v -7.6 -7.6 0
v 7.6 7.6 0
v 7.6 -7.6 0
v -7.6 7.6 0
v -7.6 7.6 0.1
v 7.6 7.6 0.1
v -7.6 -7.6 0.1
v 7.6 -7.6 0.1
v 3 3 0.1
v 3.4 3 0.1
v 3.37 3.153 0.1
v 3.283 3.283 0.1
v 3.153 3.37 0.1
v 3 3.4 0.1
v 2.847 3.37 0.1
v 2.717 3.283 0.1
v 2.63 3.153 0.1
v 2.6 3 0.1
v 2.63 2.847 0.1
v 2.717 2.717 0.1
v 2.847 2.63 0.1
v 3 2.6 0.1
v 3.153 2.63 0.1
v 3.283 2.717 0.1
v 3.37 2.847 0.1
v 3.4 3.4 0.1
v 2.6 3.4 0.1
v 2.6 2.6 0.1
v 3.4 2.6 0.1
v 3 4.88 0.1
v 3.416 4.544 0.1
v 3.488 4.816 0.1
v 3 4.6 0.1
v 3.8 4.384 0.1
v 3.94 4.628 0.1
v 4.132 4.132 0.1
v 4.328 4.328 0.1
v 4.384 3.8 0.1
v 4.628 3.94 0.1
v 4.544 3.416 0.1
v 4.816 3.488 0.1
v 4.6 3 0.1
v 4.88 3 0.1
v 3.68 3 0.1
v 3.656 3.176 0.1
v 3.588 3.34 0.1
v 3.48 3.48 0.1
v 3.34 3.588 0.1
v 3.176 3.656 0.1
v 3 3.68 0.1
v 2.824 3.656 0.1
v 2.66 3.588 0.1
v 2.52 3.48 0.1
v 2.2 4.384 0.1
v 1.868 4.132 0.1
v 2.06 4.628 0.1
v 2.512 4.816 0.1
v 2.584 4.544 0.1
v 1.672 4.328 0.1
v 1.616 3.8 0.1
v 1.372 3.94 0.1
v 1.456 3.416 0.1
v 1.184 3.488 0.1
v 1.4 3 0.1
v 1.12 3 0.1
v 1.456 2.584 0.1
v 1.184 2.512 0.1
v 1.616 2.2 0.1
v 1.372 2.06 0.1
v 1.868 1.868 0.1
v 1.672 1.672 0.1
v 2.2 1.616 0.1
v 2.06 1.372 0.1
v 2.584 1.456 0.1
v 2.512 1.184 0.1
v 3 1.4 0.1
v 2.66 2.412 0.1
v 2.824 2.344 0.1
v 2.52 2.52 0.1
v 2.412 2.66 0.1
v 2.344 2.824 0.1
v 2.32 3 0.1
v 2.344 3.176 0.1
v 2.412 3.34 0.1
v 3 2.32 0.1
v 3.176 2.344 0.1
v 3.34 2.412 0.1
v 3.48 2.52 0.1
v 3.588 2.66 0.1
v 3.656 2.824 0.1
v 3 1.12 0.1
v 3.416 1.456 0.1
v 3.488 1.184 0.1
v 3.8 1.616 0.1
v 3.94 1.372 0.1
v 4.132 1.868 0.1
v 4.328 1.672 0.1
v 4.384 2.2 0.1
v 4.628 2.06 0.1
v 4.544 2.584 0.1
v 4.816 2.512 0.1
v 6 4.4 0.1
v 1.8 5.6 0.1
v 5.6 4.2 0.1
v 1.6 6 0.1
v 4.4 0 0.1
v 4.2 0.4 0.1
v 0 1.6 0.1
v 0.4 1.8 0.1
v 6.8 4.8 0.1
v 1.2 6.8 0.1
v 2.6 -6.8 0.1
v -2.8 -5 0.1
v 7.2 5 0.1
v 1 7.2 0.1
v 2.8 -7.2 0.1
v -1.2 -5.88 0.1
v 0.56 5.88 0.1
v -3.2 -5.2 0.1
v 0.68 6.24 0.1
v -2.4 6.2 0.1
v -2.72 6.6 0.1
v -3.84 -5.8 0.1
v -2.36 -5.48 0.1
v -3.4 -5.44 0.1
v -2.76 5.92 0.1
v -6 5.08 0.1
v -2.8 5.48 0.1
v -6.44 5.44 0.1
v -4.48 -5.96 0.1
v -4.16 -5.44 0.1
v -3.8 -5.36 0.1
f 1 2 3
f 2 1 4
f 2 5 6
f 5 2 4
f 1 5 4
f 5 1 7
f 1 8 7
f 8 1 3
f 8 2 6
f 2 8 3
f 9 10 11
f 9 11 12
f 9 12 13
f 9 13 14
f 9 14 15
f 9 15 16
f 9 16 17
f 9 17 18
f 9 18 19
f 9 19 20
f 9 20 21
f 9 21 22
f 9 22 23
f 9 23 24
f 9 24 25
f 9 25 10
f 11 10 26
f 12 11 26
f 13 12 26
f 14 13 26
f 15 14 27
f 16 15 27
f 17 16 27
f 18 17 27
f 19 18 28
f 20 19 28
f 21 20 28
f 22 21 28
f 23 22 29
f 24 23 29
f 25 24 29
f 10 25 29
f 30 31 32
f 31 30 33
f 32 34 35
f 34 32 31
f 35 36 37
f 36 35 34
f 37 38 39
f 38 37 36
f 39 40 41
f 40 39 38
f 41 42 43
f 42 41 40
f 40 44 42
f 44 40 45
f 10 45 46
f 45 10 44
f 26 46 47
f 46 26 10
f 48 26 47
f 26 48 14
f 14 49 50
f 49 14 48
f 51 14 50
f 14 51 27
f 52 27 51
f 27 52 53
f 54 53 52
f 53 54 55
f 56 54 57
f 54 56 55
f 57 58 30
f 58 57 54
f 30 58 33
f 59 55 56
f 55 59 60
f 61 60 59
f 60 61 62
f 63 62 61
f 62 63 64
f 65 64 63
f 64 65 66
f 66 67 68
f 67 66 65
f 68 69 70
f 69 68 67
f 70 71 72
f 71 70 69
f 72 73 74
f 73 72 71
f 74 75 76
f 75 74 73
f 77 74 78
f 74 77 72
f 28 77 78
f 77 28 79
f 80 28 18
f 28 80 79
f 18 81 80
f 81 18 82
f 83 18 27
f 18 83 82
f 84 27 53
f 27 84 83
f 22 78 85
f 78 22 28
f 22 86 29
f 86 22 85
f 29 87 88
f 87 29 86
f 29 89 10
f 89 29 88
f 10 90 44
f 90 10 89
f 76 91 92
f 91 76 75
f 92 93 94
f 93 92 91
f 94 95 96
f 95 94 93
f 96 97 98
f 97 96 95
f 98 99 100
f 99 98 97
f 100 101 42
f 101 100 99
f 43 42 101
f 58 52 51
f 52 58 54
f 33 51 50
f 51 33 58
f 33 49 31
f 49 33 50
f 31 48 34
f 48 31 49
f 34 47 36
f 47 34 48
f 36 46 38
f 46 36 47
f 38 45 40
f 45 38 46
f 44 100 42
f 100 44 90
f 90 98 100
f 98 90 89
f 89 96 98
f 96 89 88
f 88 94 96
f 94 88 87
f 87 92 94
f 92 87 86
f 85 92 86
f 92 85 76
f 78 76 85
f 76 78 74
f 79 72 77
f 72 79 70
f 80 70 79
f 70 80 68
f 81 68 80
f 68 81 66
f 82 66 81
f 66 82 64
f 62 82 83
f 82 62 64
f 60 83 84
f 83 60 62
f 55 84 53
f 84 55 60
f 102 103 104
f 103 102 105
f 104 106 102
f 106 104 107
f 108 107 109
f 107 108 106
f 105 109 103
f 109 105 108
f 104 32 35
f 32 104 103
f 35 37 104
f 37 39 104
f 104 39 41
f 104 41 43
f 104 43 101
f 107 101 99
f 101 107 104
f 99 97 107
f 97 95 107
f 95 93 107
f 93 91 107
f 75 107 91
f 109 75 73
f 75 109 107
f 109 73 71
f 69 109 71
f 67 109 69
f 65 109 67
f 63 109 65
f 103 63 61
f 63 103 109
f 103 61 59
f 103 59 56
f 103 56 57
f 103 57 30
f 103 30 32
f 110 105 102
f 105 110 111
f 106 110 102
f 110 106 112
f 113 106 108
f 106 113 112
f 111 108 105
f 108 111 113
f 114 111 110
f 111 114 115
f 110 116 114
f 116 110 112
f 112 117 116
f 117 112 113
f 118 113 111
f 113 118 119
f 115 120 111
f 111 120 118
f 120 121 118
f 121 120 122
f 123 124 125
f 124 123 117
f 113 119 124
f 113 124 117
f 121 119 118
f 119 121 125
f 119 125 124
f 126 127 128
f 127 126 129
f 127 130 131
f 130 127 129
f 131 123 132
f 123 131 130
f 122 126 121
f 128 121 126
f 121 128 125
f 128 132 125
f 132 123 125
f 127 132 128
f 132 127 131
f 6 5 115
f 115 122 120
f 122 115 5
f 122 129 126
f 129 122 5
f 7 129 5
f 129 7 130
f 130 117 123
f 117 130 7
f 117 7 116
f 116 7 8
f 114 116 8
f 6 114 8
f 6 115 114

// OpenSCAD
// file: ../p/box5-12.scad
use <../lib.scad>
function ldraw_lib__box5_12() = [
// 0 Box with 5 Faces without Any Edges
// 0 Name: box5-12.dat
// 0 Author: Chris Dee [cwdee]
// 0 !LDRAW_ORG Primitive UPDATE 2009-02
// 0 !LICENSE Licensed under CC BY 4.0 : see CAreadme.txt
// 
// 0 BFC CERTIFY CCW
  [0,"BFC","CERTIFY"],
  [0,"BFC","CCW"],
// 
// 0 !HISTORY 2009-09-03 [PTadmin] Official Update 2009-02
// 
// 
// 4 16 1 1 1 1 1 -1 -1 1 -1 -1 1 1
  [4,16,1,1,1,1,1,-1,-1,1,-1,-1,1,1],
// 4 16 -1 0 1 1 0 1 1 1 1 -1 1 1
  [4,16,-1,0,1,1,0,1,1,1,1,-1,1,1],
// 4 16 -1 0 -1 -1 0 1 -1 1 1 -1 1 -1
  [4,16,-1,0,-1,-1,0,1,-1,1,1,-1,1,-1],
// 4 16 1 0 -1 -1 0 -1 -1 1 -1 1 1 -1
  [4,16,1,0,-1,-1,0,-1,-1,1,-1,1,1,-1],
// 4 16 1 0 1 1 0 -1 1 1 -1 1 1 1
  [4,16,1,0,1,1,0,-1,1,1,-1,1,1,1],
// 0
];
module ldraw_lib__box5_12(step=0, col=false, unit=2/5, alt=false, line=0.2, solid=!$preview)
    makepoly(ldraw_lib__box5_12(), step=step, col=col, unit=unit, alt=alt, line=line, solid=solid);
ldraw_lib__box5_12(line=0.2);
// file: ../p/4-4ndis.scad
use <../lib.scad>
function ldraw_lib__4_4ndis() = [
// 0 Disc Negative 1.0
// 0 Name: 4-4ndis.dat
// 0 Author: James Jessiman
// 0 !LDRAW_ORG Primitive UPDATE 2012-01
// 0 !LICENSE Licensed under CC BY 4.0 : see CAreadme.txt
// 
// 0 BFC CERTIFY CCW
  [0,"BFC","CERTIFY"],
  [0,"BFC","CCW"],
// 
// 0 !HISTORY 2002-03-23 [sbliss] Added BFC statement; compacted code
// 0 !HISTORY 2002-04-25 [PTadmin] Official Update 2002-02
// 0 !HISTORY 2007-06-24 [PTadmin] Header formatted for Contributor Agreement
// 0 !HISTORY 2008-07-01 [PTadmin] Official Update 2008-01
// 0 !HISTORY 2012-02-16 [Philo] Changed to CCW
// 0 !HISTORY 2012-03-30 [PTadmin] Official Update 2012-01
// 
// 
// 3 16 0.9239 0 0.3827 1 0 0 1 0 1
  [3,16,0.9239,0,0.3827,1,0,0,1,0,1],
// 3 16 0.7071 0 0.7071 0.9239 0 0.3827 1 0 1
  [3,16,0.7071,0,0.7071,0.9239,0,0.3827,1,0,1],
// 3 16 0.3827 0 0.9239 0.7071 0 0.7071 1 0 1
  [3,16,0.3827,0,0.9239,0.7071,0,0.7071,1,0,1],
// 3 16 0 0 1 0.3827 0 0.9239 1 0 1
  [3,16,0,0,1,0.3827,0,0.9239,1,0,1],
// 3 16 -0.3827 0 0.9239 0 0 1 -1 0 1
  [3,16,-0.3827,0,0.9239,0,0,1,-1,0,1],
// 3 16 -0.7071 0 0.7071 -0.3827 0 0.9239 -1 0 1
  [3,16,-0.7071,0,0.7071,-0.3827,0,0.9239,-1,0,1],
// 3 16 -0.9239 0 0.3827 -0.7071 0 0.7071 -1 0 1
  [3,16,-0.9239,0,0.3827,-0.7071,0,0.7071,-1,0,1],
// 3 16 -1 0 0 -0.9239 0 0.3827 -1 0 1
  [3,16,-1,0,0,-0.9239,0,0.3827,-1,0,1],
// 3 16 -0.9239 0 -0.3827 -1 0 0 -1 0 -1
  [3,16,-0.9239,0,-0.3827,-1,0,0,-1,0,-1],
// 3 16 -0.7071 0 -0.7071 -0.9239 0 -0.3827 -1 0 -1
  [3,16,-0.7071,0,-0.7071,-0.9239,0,-0.3827,-1,0,-1],
// 3 16 -0.3827 0 -0.9239 -0.7071 0 -0.7071 -1 0 -1
  [3,16,-0.3827,0,-0.9239,-0.7071,0,-0.7071,-1,0,-1],
// 3 16 0 0 -1 -0.3827 0 -0.9239 -1 0 -1
  [3,16,0,0,-1,-0.3827,0,-0.9239,-1,0,-1],
// 3 16 0.3827 0 -0.9239 0 0 -1 1 0 -1
  [3,16,0.3827,0,-0.9239,0,0,-1,1,0,-1],
// 3 16 0.7071 0 -0.7071 0.3827 0 -0.9239 1 0 -1
  [3,16,0.7071,0,-0.7071,0.3827,0,-0.9239,1,0,-1],
// 3 16 0.9239 0 -0.3827 0.7071 0 -0.7071 1 0 -1
  [3,16,0.9239,0,-0.3827,0.7071,0,-0.7071,1,0,-1],
// 3 16 1 0 0 0.9239 0 -0.3827 1 0 -1
  [3,16,1,0,0,0.9239,0,-0.3827,1,0,-1],
];
module ldraw_lib__4_4ndis(step=0, col=false, unit=2/5, alt=false, line=0.2, solid=!$preview)
    makepoly(ldraw_lib__4_4ndis(), step=step, col=col, unit=unit, alt=alt, line=line, solid=solid);
ldraw_lib__4_4ndis(line=0.2);
// file: ../p/4-4disc.scad
use <../lib.scad>
function ldraw_lib__4_4disc() = [
// 0 Disc 1.0
// 0 Name: 4-4disc.dat
// 0 Author: James Jessiman
// 0 !LDRAW_ORG Primitive UPDATE 2002-02
// 0 !LICENSE Licensed under CC BY 4.0 : see CAreadme.txt
// 
// 0 BFC CERTIFY CCW
  [0,"BFC","CERTIFY"],
  [0,"BFC","CCW"],
// 
// 0 !HISTORY 1998-12-15 [PTadmin] Official Update 1998-10
// 0 !HISTORY 2002-03-23 [sbliss] Added BFC statement
// 0 !HISTORY 2002-04-25 [PTadmin] Official Update 2002-02
// 0 !HISTORY 2007-06-24 [PTadmin] Header formatted for Contributor Agreement
// 0 !HISTORY 2008-07-01 [PTadmin] Official Update 2008-01
// 
// 
// 3 16 0 0 0 1 0 0 0.9239 0 0.3827
  [3,16,0,0,0,1,0,0,0.9239,0,0.3827],
// 3 16 0 0 0 0.9239 0 0.3827 0.7071 0 0.7071
  [3,16,0,0,0,0.9239,0,0.3827,0.7071,0,0.7071],
// 3 16 0 0 0 0.7071 0 0.7071 0.3827 0 0.9239
  [3,16,0,0,0,0.7071,0,0.7071,0.3827,0,0.9239],
// 3 16 0 0 0 0.3827 0 0.9239 0 0 1
  [3,16,0,0,0,0.3827,0,0.9239,0,0,1],
// 3 16 0 0 0 0 0 1 -0.3827 0 0.9239
  [3,16,0,0,0,0,0,1,-0.3827,0,0.9239],
// 3 16 0 0 0 -0.3827 0 0.9239 -0.7071 0 0.7071
  [3,16,0,0,0,-0.3827,0,0.9239,-0.7071,0,0.7071],
// 3 16 0 0 0 -0.7071 0 0.7071 -0.9239 0 0.3827
  [3,16,0,0,0,-0.7071,0,0.7071,-0.9239,0,0.3827],
// 3 16 0 0 0 -0.9239 0 0.3827 -1 0 -0
  [3,16,0,0,0,-0.9239,0,0.3827,-1,0,-0],
// 3 16 0 0 0 -1 0 -0 -0.9239 0 -0.3827
  [3,16,0,0,0,-1,0,-0,-0.9239,0,-0.3827],
// 3 16 0 0 0 -0.9239 0 -0.3827 -0.7071 0 -0.7071
  [3,16,0,0,0,-0.9239,0,-0.3827,-0.7071,0,-0.7071],
// 3 16 0 0 0 -0.7071 0 -0.7071 -0.3827 0 -0.9239
  [3,16,0,0,0,-0.7071,0,-0.7071,-0.3827,0,-0.9239],
// 3 16 0 0 0 -0.3827 0 -0.9239 0 0 -1
  [3,16,0,0,0,-0.3827,0,-0.9239,0,0,-1],
// 3 16 0 0 0 0 0 -1 0.3827 0 -0.9239
  [3,16,0,0,0,0,0,-1,0.3827,0,-0.9239],
// 3 16 0 0 0 0.3827 0 -0.9239 0.7071 0 -0.7071
  [3,16,0,0,0,0.3827,0,-0.9239,0.7071,0,-0.7071],
// 3 16 0 0 0 0.7071 0 -0.7071 0.9239 0 -0.3827
  [3,16,0,0,0,0.7071,0,-0.7071,0.9239,0,-0.3827],
// 3 16 0 0 0 0.9239 0 -0.3827 1 0 0
  [3,16,0,0,0,0.9239,0,-0.3827,1,0,0],
// 0
];
module ldraw_lib__4_4disc(step=0, col=false, unit=2/5, alt=false, line=0.2, solid=!$preview)
    makepoly(ldraw_lib__4_4disc(), step=step, col=col, unit=unit, alt=alt, line=line, solid=solid);
ldraw_lib__4_4disc(line=0.2);
// main file
use <../lib.scad>
use <../p/4-4disc.scad>
use <../p/4-4ndis.scad>
use <../p/box5-12.scad>
function ldraw_lib__192385d() = [
// 0 Sticker  1.9 x  1.9 with Tickets on Yellow Background
// 0 Name: 192385d.dat
// 0 Author: Takeshi Takahashi [RainbowDolphin]
// 0 !LDRAW_ORG Part UPDATE 2024-08
// 0 !LICENSE Licensed under CC BY 4.0 : see CAreadme.txt
// 
// 0 BFC CERTIFY CCW
  [0,"BFC","CERTIFY"],
  [0,"BFC","CCW"],
// 
// 0 !KEYWORDS Main Street, Set 6390
// 
// 0 !HISTORY 2024-09-30 [OrionP] Official Update 2024-08
// 
// 
// 1 16 0 -0.25 0 19 0 0 0 0.25 0 0 0 19 box5-12.dat
  [1,16,0,-0.25,0,19,0,0,0,0.25,0,0,0,19, ldraw_lib__box5_12()],
// 1 14 7.5 -0.25 7.5 1 0 0 0 1 0 0 0 1 4-4disc.dat
  [1,14,7.5,-0.25,7.5,1,0,0,0,1,0,0,0,1, ldraw_lib__4_4disc()],
// 1 0 7.5 -0.25 7.5 1 0 0 0 1 0 0 0 1 4-4ndis.dat
  [1,0,7.5,-0.25,7.5,1,0,0,0,1,0,0,0,1, ldraw_lib__4_4ndis()],
// 4 0 8.72 -0.25 12.04 7.5 -0.25 12.2 7.5 -0.25 11.5 8.54 -0.25 11.36
  [4,0,8.72,-0.25,12.04,7.5,-0.25,12.2,7.5,-0.25,11.5,8.54,-0.25,11.36],
// 4 0 9.85 -0.25 11.57 8.72 -0.25 12.04 8.54 -0.25 11.36 9.5 -0.25 10.96
  [4,0,9.85,-0.25,11.57,8.72,-0.25,12.04,8.54,-0.25,11.36,9.5,-0.25,10.96],
// 4 0 10.82 -0.25 10.82 9.85 -0.25 11.57 9.5 -0.25 10.96 10.33 -0.25 10.33
  [4,0,10.82,-0.25,10.82,9.85,-0.25,11.57,9.5,-0.25,10.96,10.33,-0.25,10.33],
// 4 0 11.57 -0.25 9.85 10.82 -0.25 10.82 10.33 -0.25 10.33 10.96 -0.25 9.5
  [4,0,11.57,-0.25,9.85,10.82,-0.25,10.82,10.33,-0.25,10.33,10.96,-0.25,9.5],
// 4 0 12.04 -0.25 8.72 11.57 -0.25 9.85 10.96 -0.25 9.5 11.36 -0.25 8.54
  [4,0,12.04,-0.25,8.72,11.57,-0.25,9.85,10.96,-0.25,9.5,11.36,-0.25,8.54],
// 4 0 12.2 -0.25 7.5 12.04 -0.25 8.72 11.36 -0.25 8.54 11.5 -0.25 7.5
  [4,0,12.2,-0.25,7.5,12.04,-0.25,8.72,11.36,-0.25,8.54,11.5,-0.25,7.5],
// 4 0 11.5 -0.25 7.5 11.36 -0.25 8.54 9.14 -0.25 7.94 9.2 -0.25 7.5
  [4,0,11.5,-0.25,7.5,11.36,-0.25,8.54,9.14,-0.25,7.94,9.2,-0.25,7.5],
// 4 0 8.5 -0.25 7.5 9.2 -0.25 7.5 9.14 -0.25 7.94 8.97 -0.25 8.35
  [4,0,8.5,-0.25,7.5,9.2,-0.25,7.5,9.14,-0.25,7.94,8.97,-0.25,8.35],
// 4 0 8.5 -0.25 8.5 8.5 -0.25 7.5 8.97 -0.25 8.35 8.7 -0.25 8.7
  [4,0,8.5,-0.25,8.5,8.5,-0.25,7.5,8.97,-0.25,8.35,8.7,-0.25,8.7],
// 4 0 8.5 -0.25 8.5 8.7 -0.25 8.7 8.35 -0.25 8.97 7.5 -0.25 8.5
  [4,0,8.5,-0.25,8.5,8.7,-0.25,8.7,8.35,-0.25,8.97,7.5,-0.25,8.5],
// 4 0 7.5 -0.25 8.5 8.35 -0.25 8.97 7.94 -0.25 9.14 7.5 -0.25 9.2
  [4,0,7.5,-0.25,8.5,8.35,-0.25,8.97,7.94,-0.25,9.14,7.5,-0.25,9.2],
// 4 0 7.5 -0.25 8.5 7.5 -0.25 9.2 7.06 -0.25 9.14 6.5 -0.25 8.5
  [4,0,7.5,-0.25,8.5,7.5,-0.25,9.2,7.06,-0.25,9.14,6.5,-0.25,8.5],
// 4 0 6.5 -0.25 8.5 7.06 -0.25 9.14 6.65 -0.25 8.97 6.3 -0.25 8.7
  [4,0,6.5,-0.25,8.5,7.06,-0.25,9.14,6.65,-0.25,8.97,6.3,-0.25,8.7],
// 4 0 6.3 -0.25 8.7 6.65 -0.25 8.97 5.5 -0.25 10.96 4.67 -0.25 10.33
  [4,0,6.3,-0.25,8.7,6.65,-0.25,8.97,5.5,-0.25,10.96,4.67,-0.25,10.33],
// 4 0 5.15 -0.25 11.57 4.67 -0.25 10.33 5.5 -0.25 10.96 6.28 -0.25 12.04
  [4,0,5.15,-0.25,11.57,4.67,-0.25,10.33,5.5,-0.25,10.96,6.28,-0.25,12.04],
// 4 0 6.28 -0.25 12.04 5.5 -0.25 10.96 6.46 -0.25 11.36 7.5 -0.25 12.2
  [4,0,6.28,-0.25,12.04,5.5,-0.25,10.96,6.46,-0.25,11.36,7.5,-0.25,12.2],
// 3 0 7.5 -0.25 12.2 6.46 -0.25 11.36 7.5 -0.25 11.5
  [3,0,7.5,-0.25,12.2,6.46,-0.25,11.36,7.5,-0.25,11.5],
// 4 0 4.67 -0.25 10.33 5.15 -0.25 11.57 4.18 -0.25 10.82 4.04 -0.25 9.5
  [4,0,4.67,-0.25,10.33,5.15,-0.25,11.57,4.18,-0.25,10.82,4.04,-0.25,9.5],
// 4 0 4.04 -0.25 9.5 4.18 -0.25 10.82 3.43 -0.25 9.85 3.64 -0.25 8.54
  [4,0,4.04,-0.25,9.5,4.18,-0.25,10.82,3.43,-0.25,9.85,3.64,-0.25,8.54],
// 4 0 3.64 -0.25 8.54 3.43 -0.25 9.85 2.96 -0.25 8.72 3.5 -0.25 7.5
  [4,0,3.64,-0.25,8.54,3.43,-0.25,9.85,2.96,-0.25,8.72,3.5,-0.25,7.5],
// 4 0 3.5 -0.25 7.5 2.96 -0.25 8.72 2.8 -0.25 7.5 3.64 -0.25 6.46
  [4,0,3.5,-0.25,7.5,2.96,-0.25,8.72,2.8,-0.25,7.5,3.64,-0.25,6.46],
// 4 0 3.64 -0.25 6.46 2.8 -0.25 7.5 2.96 -0.25 6.28 4.04 -0.25 5.5
  [4,0,3.64,-0.25,6.46,2.8,-0.25,7.5,2.96,-0.25,6.28,4.04,-0.25,5.5],
// 4 0 4.04 -0.25 5.5 2.96 -0.25 6.28 3.43 -0.25 5.15 4.67 -0.25 4.67
  [4,0,4.04,-0.25,5.5,2.96,-0.25,6.28,3.43,-0.25,5.15,4.67,-0.25,4.67],
// 4 0 4.67 -0.25 4.67 3.43 -0.25 5.15 4.18 -0.25 4.18 5.5 -0.25 4.04
  [4,0,4.67,-0.25,4.67,3.43,-0.25,5.15,4.18,-0.25,4.18,5.5,-0.25,4.04],
// 4 0 5.5 -0.25 4.04 4.18 -0.25 4.18 5.15 -0.25 3.43 6.46 -0.25 3.64
  [4,0,5.5,-0.25,4.04,4.18,-0.25,4.18,5.15,-0.25,3.43,6.46,-0.25,3.64],
// 4 0 6.46 -0.25 3.64 5.15 -0.25 3.43 6.28 -0.25 2.96 7.5 -0.25 3.5
  [4,0,6.46,-0.25,3.64,5.15,-0.25,3.43,6.28,-0.25,2.96,7.5,-0.25,3.5],
// 4 0 6.65 -0.25 6.03 5.5 -0.25 4.04 6.46 -0.25 3.64 7.06 -0.25 5.86
  [4,0,6.65,-0.25,6.03,5.5,-0.25,4.04,6.46,-0.25,3.64,7.06,-0.25,5.86],
// 4 0 6.65 -0.25 6.03 7.06 -0.25 5.86 6.5 -0.25 6.5 6.3 -0.25 6.3
  [4,0,6.65,-0.25,6.03,7.06,-0.25,5.86,6.5,-0.25,6.5,6.3,-0.25,6.3],
// 4 0 6.03 -0.25 6.65 6.3 -0.25 6.3 6.5 -0.25 6.5 6.5 -0.25 7.5
  [4,0,6.03,-0.25,6.65,6.3,-0.25,6.3,6.5,-0.25,6.5,6.5,-0.25,7.5],
// 4 0 5.86 -0.25 7.06 6.03 -0.25 6.65 6.5 -0.25 7.5 5.8 -0.25 7.5
  [4,0,5.86,-0.25,7.06,6.03,-0.25,6.65,6.5,-0.25,7.5,5.8,-0.25,7.5],
// 4 0 5.86 -0.25 7.94 5.8 -0.25 7.5 6.5 -0.25 7.5 6.5 -0.25 8.5
  [4,0,5.86,-0.25,7.94,5.8,-0.25,7.5,6.5,-0.25,7.5,6.5,-0.25,8.5],
// 4 0 6.03 -0.25 8.35 5.86 -0.25 7.94 6.5 -0.25 8.5 6.3 -0.25 8.7
  [4,0,6.03,-0.25,8.35,5.86,-0.25,7.94,6.5,-0.25,8.5,6.3,-0.25,8.7],
// 4 0 7.5 -0.25 6.5 6.5 -0.25 6.5 7.06 -0.25 5.86 7.5 -0.25 5.8
  [4,0,7.5,-0.25,6.5,6.5,-0.25,6.5,7.06,-0.25,5.86,7.5,-0.25,5.8],
// 4 0 7.5 -0.25 6.5 7.5 -0.25 5.8 7.94 -0.25 5.86 8.5 -0.25 6.5
  [4,0,7.5,-0.25,6.5,7.5,-0.25,5.8,7.94,-0.25,5.86,8.5,-0.25,6.5],
// 4 0 8.5 -0.25 6.5 7.94 -0.25 5.86 8.35 -0.25 6.03 8.7 -0.25 6.3
  [4,0,8.5,-0.25,6.5,7.94,-0.25,5.86,8.35,-0.25,6.03,8.7,-0.25,6.3],
// 4 0 8.5 -0.25 6.5 8.7 -0.25 6.3 8.97 -0.25 6.65 8.5 -0.25 7.5
  [4,0,8.5,-0.25,6.5,8.7,-0.25,6.3,8.97,-0.25,6.65,8.5,-0.25,7.5],
// 4 0 8.5 -0.25 7.5 8.97 -0.25 6.65 9.14 -0.25 7.06 9.2 -0.25 7.5
  [4,0,8.5,-0.25,7.5,8.97,-0.25,6.65,9.14,-0.25,7.06,9.2,-0.25,7.5],
// 4 0 7.5 -0.25 3.5 6.28 -0.25 2.96 7.5 -0.25 2.8 8.54 -0.25 3.64
  [4,0,7.5,-0.25,3.5,6.28,-0.25,2.96,7.5,-0.25,2.8,8.54,-0.25,3.64],
// 4 0 8.54 -0.25 3.64 7.5 -0.25 2.8 8.72 -0.25 2.96 9.5 -0.25 4.04
  [4,0,8.54,-0.25,3.64,7.5,-0.25,2.8,8.72,-0.25,2.96,9.5,-0.25,4.04],
// 4 0 9.5 -0.25 4.04 8.72 -0.25 2.96 9.85 -0.25 3.43 10.33 -0.25 4.67
  [4,0,9.5,-0.25,4.04,8.72,-0.25,2.96,9.85,-0.25,3.43,10.33,-0.25,4.67],
// 4 0 10.33 -0.25 4.67 9.85 -0.25 3.43 10.82 -0.25 4.18 10.96 -0.25 5.5
  [4,0,10.33,-0.25,4.67,9.85,-0.25,3.43,10.82,-0.25,4.18,10.96,-0.25,5.5],
// 4 0 10.96 -0.25 5.5 10.82 -0.25 4.18 11.57 -0.25 5.15 11.36 -0.25 6.46
  [4,0,10.96,-0.25,5.5,10.82,-0.25,4.18,11.57,-0.25,5.15,11.36,-0.25,6.46],
// 4 0 11.36 -0.25 6.46 11.57 -0.25 5.15 12.04 -0.25 6.28 11.5 -0.25 7.5
  [4,0,11.36,-0.25,6.46,11.57,-0.25,5.15,12.04,-0.25,6.28,11.5,-0.25,7.5],
// 3 0 12.2 -0.25 7.5 11.5 -0.25 7.5 12.04 -0.25 6.28
  [3,0,12.2,-0.25,7.5,11.5,-0.25,7.5,12.04,-0.25,6.28],
// 4 14 6.46 -0.25 11.36 5.5 -0.25 10.96 6.65 -0.25 8.97 7.06 -0.25 9.14
  [4,14,6.46,-0.25,11.36,5.5,-0.25,10.96,6.65,-0.25,8.97,7.06,-0.25,9.14],
// 4 14 7.5 -0.25 11.5 6.46 -0.25 11.36 7.06 -0.25 9.14 7.5 -0.25 9.2
  [4,14,7.5,-0.25,11.5,6.46,-0.25,11.36,7.06,-0.25,9.14,7.5,-0.25,9.2],
// 4 14 8.54 -0.25 11.36 7.5 -0.25 11.5 7.5 -0.25 9.2 7.94 -0.25 9.14
  [4,14,8.54,-0.25,11.36,7.5,-0.25,11.5,7.5,-0.25,9.2,7.94,-0.25,9.14],
// 4 14 9.5 -0.25 10.96 8.54 -0.25 11.36 7.94 -0.25 9.14 8.35 -0.25 8.97
  [4,14,9.5,-0.25,10.96,8.54,-0.25,11.36,7.94,-0.25,9.14,8.35,-0.25,8.97],
// 4 14 10.33 -0.25 10.33 9.5 -0.25 10.96 8.35 -0.25 8.97 8.7 -0.25 8.7
  [4,14,10.33,-0.25,10.33,9.5,-0.25,10.96,8.35,-0.25,8.97,8.7,-0.25,8.7],
// 4 14 10.96 -0.25 9.5 10.33 -0.25 10.33 8.7 -0.25 8.7 8.97 -0.25 8.35
  [4,14,10.96,-0.25,9.5,10.33,-0.25,10.33,8.7,-0.25,8.7,8.97,-0.25,8.35],
// 4 14 11.36 -0.25 8.54 10.96 -0.25 9.5 8.97 -0.25 8.35 9.14 -0.25 7.94
  [4,14,11.36,-0.25,8.54,10.96,-0.25,9.5,8.97,-0.25,8.35,9.14,-0.25,7.94],
// 4 14 11.36 -0.25 6.46 11.5 -0.25 7.5 9.2 -0.25 7.5 9.14 -0.25 7.06
  [4,14,11.36,-0.25,6.46,11.5,-0.25,7.5,9.2,-0.25,7.5,9.14,-0.25,7.06],
// 4 14 10.96 -0.25 5.5 11.36 -0.25 6.46 9.14 -0.25 7.06 8.97 -0.25 6.65
  [4,14,10.96,-0.25,5.5,11.36,-0.25,6.46,9.14,-0.25,7.06,8.97,-0.25,6.65],
// 4 14 10.33 -0.25 4.67 10.96 -0.25 5.5 8.97 -0.25 6.65 8.7 -0.25 6.3
  [4,14,10.33,-0.25,4.67,10.96,-0.25,5.5,8.97,-0.25,6.65,8.7,-0.25,6.3],
// 4 14 9.5 -0.25 4.04 10.33 -0.25 4.67 8.7 -0.25 6.3 8.35 -0.25 6.03
  [4,14,9.5,-0.25,4.04,10.33,-0.25,4.67,8.7,-0.25,6.3,8.35,-0.25,6.03],
// 4 14 8.54 -0.25 3.64 9.5 -0.25 4.04 8.35 -0.25 6.03 7.94 -0.25 5.86
  [4,14,8.54,-0.25,3.64,9.5,-0.25,4.04,8.35,-0.25,6.03,7.94,-0.25,5.86],
// 4 14 7.5 -0.25 3.5 8.54 -0.25 3.64 7.94 -0.25 5.86 7.5 -0.25 5.8
  [4,14,7.5,-0.25,3.5,8.54,-0.25,3.64,7.94,-0.25,5.86,7.5,-0.25,5.8],
// 4 14 6.46 -0.25 3.64 7.5 -0.25 3.5 7.5 -0.25 5.8 7.06 -0.25 5.86
  [4,14,6.46,-0.25,3.64,7.5,-0.25,3.5,7.5,-0.25,5.8,7.06,-0.25,5.86],
// 4 14 4.67 -0.25 4.67 5.5 -0.25 4.04 6.65 -0.25 6.03 6.3 -0.25 6.3
  [4,14,4.67,-0.25,4.67,5.5,-0.25,4.04,6.65,-0.25,6.03,6.3,-0.25,6.3],
// 4 14 4.04 -0.25 5.5 4.67 -0.25 4.67 6.3 -0.25 6.3 6.03 -0.25 6.65
  [4,14,4.04,-0.25,5.5,4.67,-0.25,4.67,6.3,-0.25,6.3,6.03,-0.25,6.65],
// 4 14 3.64 -0.25 6.46 4.04 -0.25 5.5 6.03 -0.25 6.65 5.86 -0.25 7.06
  [4,14,3.64,-0.25,6.46,4.04,-0.25,5.5,6.03,-0.25,6.65,5.86,-0.25,7.06],
// 4 14 3.5 -0.25 7.5 3.64 -0.25 6.46 5.86 -0.25 7.06 5.8 -0.25 7.5
  [4,14,3.5,-0.25,7.5,3.64,-0.25,6.46,5.86,-0.25,7.06,5.8,-0.25,7.5],
// 4 14 3.64 -0.25 8.54 3.5 -0.25 7.5 5.8 -0.25 7.5 5.86 -0.25 7.94
  [4,14,3.64,-0.25,8.54,3.5,-0.25,7.5,5.8,-0.25,7.5,5.86,-0.25,7.94],
// 4 14 4.04 -0.25 9.5 3.64 -0.25 8.54 5.86 -0.25 7.94 6.03 -0.25 8.35
  [4,14,4.04,-0.25,9.5,3.64,-0.25,8.54,5.86,-0.25,7.94,6.03,-0.25,8.35],
// 4 14 4.67 -0.25 10.33 4.04 -0.25 9.5 6.03 -0.25 8.35 6.3 -0.25 8.7
  [4,14,4.67,-0.25,10.33,4.04,-0.25,9.5,6.03,-0.25,8.35,6.3,-0.25,8.7],
// 4 0 4 -0.25 15 4.5 -0.25 14 14 -0.25 10.5 15 -0.25 11
  [4,0,4,-0.25,15,4.5,-0.25,14,14,-0.25,10.5,15,-0.25,11],
// 4 0 15 -0.25 11 14 -0.25 10.5 10.5 -0.25 1 11 -0.25 0
  [4,0,15,-0.25,11,14,-0.25,10.5,10.5,-0.25,1,11,-0.25,0],
// 4 0 11 -0.25 0 10.5 -0.25 1 1 -0.25 4.5 0 -0.25 4
  [4,0,11,-0.25,0,10.5,-0.25,1,1,-0.25,4.5,0,-0.25,4],
// 4 0 0 -0.25 4 1 -0.25 4.5 4.5 -0.25 14 4 -0.25 15
  [4,0,0,-0.25,4,1,-0.25,4.5,4.5,-0.25,14,4,-0.25,15],
// 4 14 14 -0.25 10.5 4.5 -0.25 14 8.72 -0.25 12.04 9.85 -0.25 11.57
  [4,14,14,-0.25,10.5,4.5,-0.25,14,8.72,-0.25,12.04,9.85,-0.25,11.57],
// 3 14 9.85 -0.25 11.57 10.82 -0.25 10.82 14 -0.25 10.5
  [3,14,9.85,-0.25,11.57,10.82,-0.25,10.82,14,-0.25,10.5],
// 3 14 10.82 -0.25 10.82 11.57 -0.25 9.85 14 -0.25 10.5
  [3,14,10.82,-0.25,10.82,11.57,-0.25,9.85,14,-0.25,10.5],
// 3 14 14 -0.25 10.5 11.57 -0.25 9.85 12.04 -0.25 8.72
  [3,14,14,-0.25,10.5,11.57,-0.25,9.85,12.04,-0.25,8.72],
// 3 14 14 -0.25 10.5 12.04 -0.25 8.72 12.2 -0.25 7.5
  [3,14,14,-0.25,10.5,12.04,-0.25,8.72,12.2,-0.25,7.5],
// 3 14 14 -0.25 10.5 12.2 -0.25 7.5 12.04 -0.25 6.28
  [3,14,14,-0.25,10.5,12.2,-0.25,7.5,12.04,-0.25,6.28],
// 4 14 10.5 -0.25 1 14 -0.25 10.5 12.04 -0.25 6.28 11.57 -0.25 5.15
  [4,14,10.5,-0.25,1,14,-0.25,10.5,12.04,-0.25,6.28,11.57,-0.25,5.15],
// 3 14 11.57 -0.25 5.15 10.82 -0.25 4.18 10.5 -0.25 1
  [3,14,11.57,-0.25,5.15,10.82,-0.25,4.18,10.5,-0.25,1],
// 3 14 10.82 -0.25 4.18 9.85 -0.25 3.43 10.5 -0.25 1
  [3,14,10.82,-0.25,4.18,9.85,-0.25,3.43,10.5,-0.25,1],
// 3 14 9.85 -0.25 3.43 8.72 -0.25 2.96 10.5 -0.25 1
  [3,14,9.85,-0.25,3.43,8.72,-0.25,2.96,10.5,-0.25,1],
// 3 14 8.72 -0.25 2.96 7.5 -0.25 2.8 10.5 -0.25 1
  [3,14,8.72,-0.25,2.96,7.5,-0.25,2.8,10.5,-0.25,1],
// 3 14 6.28 -0.25 2.96 10.5 -0.25 1 7.5 -0.25 2.8
  [3,14,6.28,-0.25,2.96,10.5,-0.25,1,7.5,-0.25,2.8],
// 4 14 1 -0.25 4.5 10.5 -0.25 1 6.28 -0.25 2.96 5.15 -0.25 3.43
  [4,14,1,-0.25,4.5,10.5,-0.25,1,6.28,-0.25,2.96,5.15,-0.25,3.43],
// 3 14 1 -0.25 4.5 5.15 -0.25 3.43 4.18 -0.25 4.18
  [3,14,1,-0.25,4.5,5.15,-0.25,3.43,4.18,-0.25,4.18],
// 3 14 3.43 -0.25 5.15 1 -0.25 4.5 4.18 -0.25 4.18
  [3,14,3.43,-0.25,5.15,1,-0.25,4.5,4.18,-0.25,4.18],
// 3 14 2.96 -0.25 6.28 1 -0.25 4.5 3.43 -0.25 5.15
  [3,14,2.96,-0.25,6.28,1,-0.25,4.5,3.43,-0.25,5.15],
// 3 14 2.8 -0.25 7.5 1 -0.25 4.5 2.96 -0.25 6.28
  [3,14,2.8,-0.25,7.5,1,-0.25,4.5,2.96,-0.25,6.28],
// 3 14 2.96 -0.25 8.72 1 -0.25 4.5 2.8 -0.25 7.5
  [3,14,2.96,-0.25,8.72,1,-0.25,4.5,2.8,-0.25,7.5],
// 4 14 4.5 -0.25 14 1 -0.25 4.5 2.96 -0.25 8.72 3.43 -0.25 9.85
  [4,14,4.5,-0.25,14,1,-0.25,4.5,2.96,-0.25,8.72,3.43,-0.25,9.85],
// 3 14 4.5 -0.25 14 3.43 -0.25 9.85 4.18 -0.25 10.82
  [3,14,4.5,-0.25,14,3.43,-0.25,9.85,4.18,-0.25,10.82],
// 3 14 4.5 -0.25 14 4.18 -0.25 10.82 5.15 -0.25 11.57
  [3,14,4.5,-0.25,14,4.18,-0.25,10.82,5.15,-0.25,11.57],
// 3 14 4.5 -0.25 14 5.15 -0.25 11.57 6.28 -0.25 12.04
  [3,14,4.5,-0.25,14,5.15,-0.25,11.57,6.28,-0.25,12.04],
// 3 14 4.5 -0.25 14 6.28 -0.25 12.04 7.5 -0.25 12.2
  [3,14,4.5,-0.25,14,6.28,-0.25,12.04,7.5,-0.25,12.2],
// 3 14 4.5 -0.25 14 7.5 -0.25 12.2 8.72 -0.25 12.04
  [3,14,4.5,-0.25,14,7.5,-0.25,12.2,8.72,-0.25,12.04],
// 4 14 3 -0.25 17 4 -0.25 15 15 -0.25 11 17 -0.25 12
  [4,14,3,-0.25,17,4,-0.25,15,15,-0.25,11,17,-0.25,12],
// 4 14 17 -0.25 12 15 -0.25 11 11 -0.25 0 6.5 -0.25 -17
  [4,14,17,-0.25,12,15,-0.25,11,11,-0.25,0,6.5,-0.25,-17],
// 4 14 6.5 -0.25 -17 11 -0.25 0 0 -0.25 4 -7 -0.25 -12.5
  [4,14,6.5,-0.25,-17,11,-0.25,0,0,-0.25,4,-7,-0.25,-12.5],
// 4 14 0 -0.25 4 4 -0.25 15 3 -0.25 17 -7 -0.25 -12.5
  [4,14,0,-0.25,4,4,-0.25,15,3,-0.25,17,-7,-0.25,-12.5],
// 4 0 2.5 -0.25 18 3 -0.25 17 17 -0.25 12 18 -0.25 12.5
  [4,0,2.5,-0.25,18,3,-0.25,17,17,-0.25,12,18,-0.25,12.5],
// 4 0 18 -0.25 12.5 17 -0.25 12 6.5 -0.25 -17 7 -0.25 -18
  [4,0,18,-0.25,12.5,17,-0.25,12,6.5,-0.25,-17,7,-0.25,-18],
// 4 0 7 -0.25 -18 6.5 -0.25 -17 -7 -0.25 -12.5 -3 -0.25 -14.7
  [4,0,7,-0.25,-18,6.5,-0.25,-17,-7,-0.25,-12.5,-3,-0.25,-14.7],
// 4 0 -8 -0.25 -13 -7 -0.25 -12.5 3 -0.25 17 1.4 -0.25 14.7
  [4,0,-8,-0.25,-13,-7,-0.25,-12.5,3,-0.25,17,1.4,-0.25,14.7],
// 3 0 2.5 -0.25 18 1.7 -0.25 15.6 3 -0.25 17
  [3,0,2.5,-0.25,18,1.7,-0.25,15.6,3,-0.25,17],
// 3 0 3 -0.25 17 1.7 -0.25 15.6 1.4 -0.25 14.7
  [3,0,3,-0.25,17,1.7,-0.25,15.6,1.4,-0.25,14.7],
// 4 0 -6 -0.25 15.5 1.4 -0.25 14.7 1.7 -0.25 15.6 -6.8 -0.25 16.5
  [4,0,-6,-0.25,15.5,1.4,-0.25,14.7,1.7,-0.25,15.6,-6.8,-0.25,16.5],
// 4 0 -8.5 -0.25 -13.6 -9.6 -0.25 -14.5 -3 -0.25 -14.7 -5.9 -0.25 -13.7
  [4,0,-8.5,-0.25,-13.6,-9.6,-0.25,-14.5,-3,-0.25,-14.7,-5.9,-0.25,-13.7],
// 3 0 -7 -0.25 -12.5 -8 -0.25 -13 -5.9 -0.25 -13.7
  [3,0,-7,-0.25,-12.5,-8,-0.25,-13,-5.9,-0.25,-13.7],
// 3 0 -7 -0.25 -12.5 -5.9 -0.25 -13.7 -3 -0.25 -14.7
  [3,0,-7,-0.25,-12.5,-5.9,-0.25,-13.7,-3,-0.25,-14.7],
// 4 14 -8 -0.25 -13 1.4 -0.25 14.7 -6 -0.25 15.5 -8.5 -0.25 -13.6
  [4,14,-8,-0.25,-13,1.4,-0.25,14.7,-6,-0.25,15.5,-8.5,-0.25,-13.6],
// 3 14 -8 -0.25 -13 -8.5 -0.25 -13.6 -5.9 -0.25 -13.7
  [3,14,-8,-0.25,-13,-8.5,-0.25,-13.6,-5.9,-0.25,-13.7],
// 4 0 -15 -0.25 12.7 -7 -0.25 13.7 -6.9 -0.25 14.8 -16.1 -0.25 13.6
  [4,0,-15,-0.25,12.7,-7,-0.25,13.7,-6.9,-0.25,14.8,-16.1,-0.25,13.6],
// 4 0 -10.4 -0.25 -13.6 -15 -0.25 12.7 -16.1 -0.25 13.6 -11.2 -0.25 -14.9
  [4,0,-10.4,-0.25,-13.6,-15,-0.25,12.7,-16.1,-0.25,13.6,-11.2,-0.25,-14.9],
// 4 0 -10.4 -0.25 -13.6 -11.2 -0.25 -14.9 -9.6 -0.25 -14.5 -9.5 -0.25 -13.4
  [4,0,-10.4,-0.25,-13.6,-11.2,-0.25,-14.9,-9.6,-0.25,-14.5,-9.5,-0.25,-13.4],
// 3 0 -6.8 -0.25 16.5 -6.9 -0.25 14.8 -6 -0.25 15.5
  [3,0,-6.8,-0.25,16.5,-6.9,-0.25,14.8,-6,-0.25,15.5],
// 4 0 -6 -0.25 15.5 -6.9 -0.25 14.8 -7 -0.25 13.7 -8.5 -0.25 -13.6
  [4,0,-6,-0.25,15.5,-6.9,-0.25,14.8,-7,-0.25,13.7,-8.5,-0.25,-13.6],
// 3 0 -7 -0.25 13.7 -9.5 -0.25 -13.4 -8.5 -0.25 -13.6
  [3,0,-7,-0.25,13.7,-9.5,-0.25,-13.4,-8.5,-0.25,-13.6],
// 3 0 -9.5 -0.25 -13.4 -9.6 -0.25 -14.5 -8.5 -0.25 -13.6
  [3,0,-9.5,-0.25,-13.4,-9.6,-0.25,-14.5,-8.5,-0.25,-13.6],
// 4 14 -9.5 -0.25 -13.4 -7 -0.25 13.7 -15 -0.25 12.7 -10.4 -0.25 -13.6
  [4,14,-9.5,-0.25,-13.4,-7,-0.25,13.7,-15,-0.25,12.7,-10.4,-0.25,-13.6],
// 3 14 19 -0.25 19 -19 -0.25 19 2.5 -0.25 18
  [3,14,19,-0.25,19,-19,-0.25,19,2.5,-0.25,18],
// 4 14 2.5 -0.25 18 -19 -0.25 19 -6.8 -0.25 16.5 1.7 -0.25 15.6
  [4,14,2.5,-0.25,18,-19,-0.25,19,-6.8,-0.25,16.5,1.7,-0.25,15.6],
// 4 14 -6.9 -0.25 14.8 -6.8 -0.25 16.5 -19 -0.25 19 -16.1 -0.25 13.6
  [4,14,-6.9,-0.25,14.8,-6.8,-0.25,16.5,-19,-0.25,19,-16.1,-0.25,13.6],
// 4 14 -16.1 -0.25 13.6 -19 -0.25 19 -19 -0.25 -19 -11.2 -0.25 -14.9
  [4,14,-16.1,-0.25,13.6,-19,-0.25,19,-19,-0.25,-19,-11.2,-0.25,-14.9],
// 4 14 -9.6 -0.25 -14.5 -11.2 -0.25 -14.9 -19 -0.25 -19 -3 -0.25 -14.7
  [4,14,-9.6,-0.25,-14.5,-11.2,-0.25,-14.9,-19,-0.25,-19,-3,-0.25,-14.7],
// 3 14 -3 -0.25 -14.7 -19 -0.25 -19 7 -0.25 -18
  [3,14,-3,-0.25,-14.7,-19,-0.25,-19,7,-0.25,-18],
// 3 14 7 -0.25 -18 -19 -0.25 -19 19 -0.25 -19
  [3,14,7,-0.25,-18,-19,-0.25,-19,19,-0.25,-19],
// 3 14 18 -0.25 12.5 7 -0.25 -18 19 -0.25 -19
  [3,14,18,-0.25,12.5,7,-0.25,-18,19,-0.25,-19],
// 3 14 19 -0.25 19 18 -0.25 12.5 19 -0.25 -19
  [3,14,19,-0.25,19,18,-0.25,12.5,19,-0.25,-19],
// 3 14 19 -0.25 19 2.5 -0.25 18 18 -0.25 12.5
  [3,14,19,-0.25,19,2.5,-0.25,18,18,-0.25,12.5],
];
module ldraw_lib__192385d(step=0, col=false, unit=2/5, alt=false, line=0.2, solid=!$preview)
    makepoly(ldraw_lib__192385d(), step=step, col=col, unit=unit, alt=alt, line=line, solid=solid);
ldraw_lib__192385d(line=0.2);
